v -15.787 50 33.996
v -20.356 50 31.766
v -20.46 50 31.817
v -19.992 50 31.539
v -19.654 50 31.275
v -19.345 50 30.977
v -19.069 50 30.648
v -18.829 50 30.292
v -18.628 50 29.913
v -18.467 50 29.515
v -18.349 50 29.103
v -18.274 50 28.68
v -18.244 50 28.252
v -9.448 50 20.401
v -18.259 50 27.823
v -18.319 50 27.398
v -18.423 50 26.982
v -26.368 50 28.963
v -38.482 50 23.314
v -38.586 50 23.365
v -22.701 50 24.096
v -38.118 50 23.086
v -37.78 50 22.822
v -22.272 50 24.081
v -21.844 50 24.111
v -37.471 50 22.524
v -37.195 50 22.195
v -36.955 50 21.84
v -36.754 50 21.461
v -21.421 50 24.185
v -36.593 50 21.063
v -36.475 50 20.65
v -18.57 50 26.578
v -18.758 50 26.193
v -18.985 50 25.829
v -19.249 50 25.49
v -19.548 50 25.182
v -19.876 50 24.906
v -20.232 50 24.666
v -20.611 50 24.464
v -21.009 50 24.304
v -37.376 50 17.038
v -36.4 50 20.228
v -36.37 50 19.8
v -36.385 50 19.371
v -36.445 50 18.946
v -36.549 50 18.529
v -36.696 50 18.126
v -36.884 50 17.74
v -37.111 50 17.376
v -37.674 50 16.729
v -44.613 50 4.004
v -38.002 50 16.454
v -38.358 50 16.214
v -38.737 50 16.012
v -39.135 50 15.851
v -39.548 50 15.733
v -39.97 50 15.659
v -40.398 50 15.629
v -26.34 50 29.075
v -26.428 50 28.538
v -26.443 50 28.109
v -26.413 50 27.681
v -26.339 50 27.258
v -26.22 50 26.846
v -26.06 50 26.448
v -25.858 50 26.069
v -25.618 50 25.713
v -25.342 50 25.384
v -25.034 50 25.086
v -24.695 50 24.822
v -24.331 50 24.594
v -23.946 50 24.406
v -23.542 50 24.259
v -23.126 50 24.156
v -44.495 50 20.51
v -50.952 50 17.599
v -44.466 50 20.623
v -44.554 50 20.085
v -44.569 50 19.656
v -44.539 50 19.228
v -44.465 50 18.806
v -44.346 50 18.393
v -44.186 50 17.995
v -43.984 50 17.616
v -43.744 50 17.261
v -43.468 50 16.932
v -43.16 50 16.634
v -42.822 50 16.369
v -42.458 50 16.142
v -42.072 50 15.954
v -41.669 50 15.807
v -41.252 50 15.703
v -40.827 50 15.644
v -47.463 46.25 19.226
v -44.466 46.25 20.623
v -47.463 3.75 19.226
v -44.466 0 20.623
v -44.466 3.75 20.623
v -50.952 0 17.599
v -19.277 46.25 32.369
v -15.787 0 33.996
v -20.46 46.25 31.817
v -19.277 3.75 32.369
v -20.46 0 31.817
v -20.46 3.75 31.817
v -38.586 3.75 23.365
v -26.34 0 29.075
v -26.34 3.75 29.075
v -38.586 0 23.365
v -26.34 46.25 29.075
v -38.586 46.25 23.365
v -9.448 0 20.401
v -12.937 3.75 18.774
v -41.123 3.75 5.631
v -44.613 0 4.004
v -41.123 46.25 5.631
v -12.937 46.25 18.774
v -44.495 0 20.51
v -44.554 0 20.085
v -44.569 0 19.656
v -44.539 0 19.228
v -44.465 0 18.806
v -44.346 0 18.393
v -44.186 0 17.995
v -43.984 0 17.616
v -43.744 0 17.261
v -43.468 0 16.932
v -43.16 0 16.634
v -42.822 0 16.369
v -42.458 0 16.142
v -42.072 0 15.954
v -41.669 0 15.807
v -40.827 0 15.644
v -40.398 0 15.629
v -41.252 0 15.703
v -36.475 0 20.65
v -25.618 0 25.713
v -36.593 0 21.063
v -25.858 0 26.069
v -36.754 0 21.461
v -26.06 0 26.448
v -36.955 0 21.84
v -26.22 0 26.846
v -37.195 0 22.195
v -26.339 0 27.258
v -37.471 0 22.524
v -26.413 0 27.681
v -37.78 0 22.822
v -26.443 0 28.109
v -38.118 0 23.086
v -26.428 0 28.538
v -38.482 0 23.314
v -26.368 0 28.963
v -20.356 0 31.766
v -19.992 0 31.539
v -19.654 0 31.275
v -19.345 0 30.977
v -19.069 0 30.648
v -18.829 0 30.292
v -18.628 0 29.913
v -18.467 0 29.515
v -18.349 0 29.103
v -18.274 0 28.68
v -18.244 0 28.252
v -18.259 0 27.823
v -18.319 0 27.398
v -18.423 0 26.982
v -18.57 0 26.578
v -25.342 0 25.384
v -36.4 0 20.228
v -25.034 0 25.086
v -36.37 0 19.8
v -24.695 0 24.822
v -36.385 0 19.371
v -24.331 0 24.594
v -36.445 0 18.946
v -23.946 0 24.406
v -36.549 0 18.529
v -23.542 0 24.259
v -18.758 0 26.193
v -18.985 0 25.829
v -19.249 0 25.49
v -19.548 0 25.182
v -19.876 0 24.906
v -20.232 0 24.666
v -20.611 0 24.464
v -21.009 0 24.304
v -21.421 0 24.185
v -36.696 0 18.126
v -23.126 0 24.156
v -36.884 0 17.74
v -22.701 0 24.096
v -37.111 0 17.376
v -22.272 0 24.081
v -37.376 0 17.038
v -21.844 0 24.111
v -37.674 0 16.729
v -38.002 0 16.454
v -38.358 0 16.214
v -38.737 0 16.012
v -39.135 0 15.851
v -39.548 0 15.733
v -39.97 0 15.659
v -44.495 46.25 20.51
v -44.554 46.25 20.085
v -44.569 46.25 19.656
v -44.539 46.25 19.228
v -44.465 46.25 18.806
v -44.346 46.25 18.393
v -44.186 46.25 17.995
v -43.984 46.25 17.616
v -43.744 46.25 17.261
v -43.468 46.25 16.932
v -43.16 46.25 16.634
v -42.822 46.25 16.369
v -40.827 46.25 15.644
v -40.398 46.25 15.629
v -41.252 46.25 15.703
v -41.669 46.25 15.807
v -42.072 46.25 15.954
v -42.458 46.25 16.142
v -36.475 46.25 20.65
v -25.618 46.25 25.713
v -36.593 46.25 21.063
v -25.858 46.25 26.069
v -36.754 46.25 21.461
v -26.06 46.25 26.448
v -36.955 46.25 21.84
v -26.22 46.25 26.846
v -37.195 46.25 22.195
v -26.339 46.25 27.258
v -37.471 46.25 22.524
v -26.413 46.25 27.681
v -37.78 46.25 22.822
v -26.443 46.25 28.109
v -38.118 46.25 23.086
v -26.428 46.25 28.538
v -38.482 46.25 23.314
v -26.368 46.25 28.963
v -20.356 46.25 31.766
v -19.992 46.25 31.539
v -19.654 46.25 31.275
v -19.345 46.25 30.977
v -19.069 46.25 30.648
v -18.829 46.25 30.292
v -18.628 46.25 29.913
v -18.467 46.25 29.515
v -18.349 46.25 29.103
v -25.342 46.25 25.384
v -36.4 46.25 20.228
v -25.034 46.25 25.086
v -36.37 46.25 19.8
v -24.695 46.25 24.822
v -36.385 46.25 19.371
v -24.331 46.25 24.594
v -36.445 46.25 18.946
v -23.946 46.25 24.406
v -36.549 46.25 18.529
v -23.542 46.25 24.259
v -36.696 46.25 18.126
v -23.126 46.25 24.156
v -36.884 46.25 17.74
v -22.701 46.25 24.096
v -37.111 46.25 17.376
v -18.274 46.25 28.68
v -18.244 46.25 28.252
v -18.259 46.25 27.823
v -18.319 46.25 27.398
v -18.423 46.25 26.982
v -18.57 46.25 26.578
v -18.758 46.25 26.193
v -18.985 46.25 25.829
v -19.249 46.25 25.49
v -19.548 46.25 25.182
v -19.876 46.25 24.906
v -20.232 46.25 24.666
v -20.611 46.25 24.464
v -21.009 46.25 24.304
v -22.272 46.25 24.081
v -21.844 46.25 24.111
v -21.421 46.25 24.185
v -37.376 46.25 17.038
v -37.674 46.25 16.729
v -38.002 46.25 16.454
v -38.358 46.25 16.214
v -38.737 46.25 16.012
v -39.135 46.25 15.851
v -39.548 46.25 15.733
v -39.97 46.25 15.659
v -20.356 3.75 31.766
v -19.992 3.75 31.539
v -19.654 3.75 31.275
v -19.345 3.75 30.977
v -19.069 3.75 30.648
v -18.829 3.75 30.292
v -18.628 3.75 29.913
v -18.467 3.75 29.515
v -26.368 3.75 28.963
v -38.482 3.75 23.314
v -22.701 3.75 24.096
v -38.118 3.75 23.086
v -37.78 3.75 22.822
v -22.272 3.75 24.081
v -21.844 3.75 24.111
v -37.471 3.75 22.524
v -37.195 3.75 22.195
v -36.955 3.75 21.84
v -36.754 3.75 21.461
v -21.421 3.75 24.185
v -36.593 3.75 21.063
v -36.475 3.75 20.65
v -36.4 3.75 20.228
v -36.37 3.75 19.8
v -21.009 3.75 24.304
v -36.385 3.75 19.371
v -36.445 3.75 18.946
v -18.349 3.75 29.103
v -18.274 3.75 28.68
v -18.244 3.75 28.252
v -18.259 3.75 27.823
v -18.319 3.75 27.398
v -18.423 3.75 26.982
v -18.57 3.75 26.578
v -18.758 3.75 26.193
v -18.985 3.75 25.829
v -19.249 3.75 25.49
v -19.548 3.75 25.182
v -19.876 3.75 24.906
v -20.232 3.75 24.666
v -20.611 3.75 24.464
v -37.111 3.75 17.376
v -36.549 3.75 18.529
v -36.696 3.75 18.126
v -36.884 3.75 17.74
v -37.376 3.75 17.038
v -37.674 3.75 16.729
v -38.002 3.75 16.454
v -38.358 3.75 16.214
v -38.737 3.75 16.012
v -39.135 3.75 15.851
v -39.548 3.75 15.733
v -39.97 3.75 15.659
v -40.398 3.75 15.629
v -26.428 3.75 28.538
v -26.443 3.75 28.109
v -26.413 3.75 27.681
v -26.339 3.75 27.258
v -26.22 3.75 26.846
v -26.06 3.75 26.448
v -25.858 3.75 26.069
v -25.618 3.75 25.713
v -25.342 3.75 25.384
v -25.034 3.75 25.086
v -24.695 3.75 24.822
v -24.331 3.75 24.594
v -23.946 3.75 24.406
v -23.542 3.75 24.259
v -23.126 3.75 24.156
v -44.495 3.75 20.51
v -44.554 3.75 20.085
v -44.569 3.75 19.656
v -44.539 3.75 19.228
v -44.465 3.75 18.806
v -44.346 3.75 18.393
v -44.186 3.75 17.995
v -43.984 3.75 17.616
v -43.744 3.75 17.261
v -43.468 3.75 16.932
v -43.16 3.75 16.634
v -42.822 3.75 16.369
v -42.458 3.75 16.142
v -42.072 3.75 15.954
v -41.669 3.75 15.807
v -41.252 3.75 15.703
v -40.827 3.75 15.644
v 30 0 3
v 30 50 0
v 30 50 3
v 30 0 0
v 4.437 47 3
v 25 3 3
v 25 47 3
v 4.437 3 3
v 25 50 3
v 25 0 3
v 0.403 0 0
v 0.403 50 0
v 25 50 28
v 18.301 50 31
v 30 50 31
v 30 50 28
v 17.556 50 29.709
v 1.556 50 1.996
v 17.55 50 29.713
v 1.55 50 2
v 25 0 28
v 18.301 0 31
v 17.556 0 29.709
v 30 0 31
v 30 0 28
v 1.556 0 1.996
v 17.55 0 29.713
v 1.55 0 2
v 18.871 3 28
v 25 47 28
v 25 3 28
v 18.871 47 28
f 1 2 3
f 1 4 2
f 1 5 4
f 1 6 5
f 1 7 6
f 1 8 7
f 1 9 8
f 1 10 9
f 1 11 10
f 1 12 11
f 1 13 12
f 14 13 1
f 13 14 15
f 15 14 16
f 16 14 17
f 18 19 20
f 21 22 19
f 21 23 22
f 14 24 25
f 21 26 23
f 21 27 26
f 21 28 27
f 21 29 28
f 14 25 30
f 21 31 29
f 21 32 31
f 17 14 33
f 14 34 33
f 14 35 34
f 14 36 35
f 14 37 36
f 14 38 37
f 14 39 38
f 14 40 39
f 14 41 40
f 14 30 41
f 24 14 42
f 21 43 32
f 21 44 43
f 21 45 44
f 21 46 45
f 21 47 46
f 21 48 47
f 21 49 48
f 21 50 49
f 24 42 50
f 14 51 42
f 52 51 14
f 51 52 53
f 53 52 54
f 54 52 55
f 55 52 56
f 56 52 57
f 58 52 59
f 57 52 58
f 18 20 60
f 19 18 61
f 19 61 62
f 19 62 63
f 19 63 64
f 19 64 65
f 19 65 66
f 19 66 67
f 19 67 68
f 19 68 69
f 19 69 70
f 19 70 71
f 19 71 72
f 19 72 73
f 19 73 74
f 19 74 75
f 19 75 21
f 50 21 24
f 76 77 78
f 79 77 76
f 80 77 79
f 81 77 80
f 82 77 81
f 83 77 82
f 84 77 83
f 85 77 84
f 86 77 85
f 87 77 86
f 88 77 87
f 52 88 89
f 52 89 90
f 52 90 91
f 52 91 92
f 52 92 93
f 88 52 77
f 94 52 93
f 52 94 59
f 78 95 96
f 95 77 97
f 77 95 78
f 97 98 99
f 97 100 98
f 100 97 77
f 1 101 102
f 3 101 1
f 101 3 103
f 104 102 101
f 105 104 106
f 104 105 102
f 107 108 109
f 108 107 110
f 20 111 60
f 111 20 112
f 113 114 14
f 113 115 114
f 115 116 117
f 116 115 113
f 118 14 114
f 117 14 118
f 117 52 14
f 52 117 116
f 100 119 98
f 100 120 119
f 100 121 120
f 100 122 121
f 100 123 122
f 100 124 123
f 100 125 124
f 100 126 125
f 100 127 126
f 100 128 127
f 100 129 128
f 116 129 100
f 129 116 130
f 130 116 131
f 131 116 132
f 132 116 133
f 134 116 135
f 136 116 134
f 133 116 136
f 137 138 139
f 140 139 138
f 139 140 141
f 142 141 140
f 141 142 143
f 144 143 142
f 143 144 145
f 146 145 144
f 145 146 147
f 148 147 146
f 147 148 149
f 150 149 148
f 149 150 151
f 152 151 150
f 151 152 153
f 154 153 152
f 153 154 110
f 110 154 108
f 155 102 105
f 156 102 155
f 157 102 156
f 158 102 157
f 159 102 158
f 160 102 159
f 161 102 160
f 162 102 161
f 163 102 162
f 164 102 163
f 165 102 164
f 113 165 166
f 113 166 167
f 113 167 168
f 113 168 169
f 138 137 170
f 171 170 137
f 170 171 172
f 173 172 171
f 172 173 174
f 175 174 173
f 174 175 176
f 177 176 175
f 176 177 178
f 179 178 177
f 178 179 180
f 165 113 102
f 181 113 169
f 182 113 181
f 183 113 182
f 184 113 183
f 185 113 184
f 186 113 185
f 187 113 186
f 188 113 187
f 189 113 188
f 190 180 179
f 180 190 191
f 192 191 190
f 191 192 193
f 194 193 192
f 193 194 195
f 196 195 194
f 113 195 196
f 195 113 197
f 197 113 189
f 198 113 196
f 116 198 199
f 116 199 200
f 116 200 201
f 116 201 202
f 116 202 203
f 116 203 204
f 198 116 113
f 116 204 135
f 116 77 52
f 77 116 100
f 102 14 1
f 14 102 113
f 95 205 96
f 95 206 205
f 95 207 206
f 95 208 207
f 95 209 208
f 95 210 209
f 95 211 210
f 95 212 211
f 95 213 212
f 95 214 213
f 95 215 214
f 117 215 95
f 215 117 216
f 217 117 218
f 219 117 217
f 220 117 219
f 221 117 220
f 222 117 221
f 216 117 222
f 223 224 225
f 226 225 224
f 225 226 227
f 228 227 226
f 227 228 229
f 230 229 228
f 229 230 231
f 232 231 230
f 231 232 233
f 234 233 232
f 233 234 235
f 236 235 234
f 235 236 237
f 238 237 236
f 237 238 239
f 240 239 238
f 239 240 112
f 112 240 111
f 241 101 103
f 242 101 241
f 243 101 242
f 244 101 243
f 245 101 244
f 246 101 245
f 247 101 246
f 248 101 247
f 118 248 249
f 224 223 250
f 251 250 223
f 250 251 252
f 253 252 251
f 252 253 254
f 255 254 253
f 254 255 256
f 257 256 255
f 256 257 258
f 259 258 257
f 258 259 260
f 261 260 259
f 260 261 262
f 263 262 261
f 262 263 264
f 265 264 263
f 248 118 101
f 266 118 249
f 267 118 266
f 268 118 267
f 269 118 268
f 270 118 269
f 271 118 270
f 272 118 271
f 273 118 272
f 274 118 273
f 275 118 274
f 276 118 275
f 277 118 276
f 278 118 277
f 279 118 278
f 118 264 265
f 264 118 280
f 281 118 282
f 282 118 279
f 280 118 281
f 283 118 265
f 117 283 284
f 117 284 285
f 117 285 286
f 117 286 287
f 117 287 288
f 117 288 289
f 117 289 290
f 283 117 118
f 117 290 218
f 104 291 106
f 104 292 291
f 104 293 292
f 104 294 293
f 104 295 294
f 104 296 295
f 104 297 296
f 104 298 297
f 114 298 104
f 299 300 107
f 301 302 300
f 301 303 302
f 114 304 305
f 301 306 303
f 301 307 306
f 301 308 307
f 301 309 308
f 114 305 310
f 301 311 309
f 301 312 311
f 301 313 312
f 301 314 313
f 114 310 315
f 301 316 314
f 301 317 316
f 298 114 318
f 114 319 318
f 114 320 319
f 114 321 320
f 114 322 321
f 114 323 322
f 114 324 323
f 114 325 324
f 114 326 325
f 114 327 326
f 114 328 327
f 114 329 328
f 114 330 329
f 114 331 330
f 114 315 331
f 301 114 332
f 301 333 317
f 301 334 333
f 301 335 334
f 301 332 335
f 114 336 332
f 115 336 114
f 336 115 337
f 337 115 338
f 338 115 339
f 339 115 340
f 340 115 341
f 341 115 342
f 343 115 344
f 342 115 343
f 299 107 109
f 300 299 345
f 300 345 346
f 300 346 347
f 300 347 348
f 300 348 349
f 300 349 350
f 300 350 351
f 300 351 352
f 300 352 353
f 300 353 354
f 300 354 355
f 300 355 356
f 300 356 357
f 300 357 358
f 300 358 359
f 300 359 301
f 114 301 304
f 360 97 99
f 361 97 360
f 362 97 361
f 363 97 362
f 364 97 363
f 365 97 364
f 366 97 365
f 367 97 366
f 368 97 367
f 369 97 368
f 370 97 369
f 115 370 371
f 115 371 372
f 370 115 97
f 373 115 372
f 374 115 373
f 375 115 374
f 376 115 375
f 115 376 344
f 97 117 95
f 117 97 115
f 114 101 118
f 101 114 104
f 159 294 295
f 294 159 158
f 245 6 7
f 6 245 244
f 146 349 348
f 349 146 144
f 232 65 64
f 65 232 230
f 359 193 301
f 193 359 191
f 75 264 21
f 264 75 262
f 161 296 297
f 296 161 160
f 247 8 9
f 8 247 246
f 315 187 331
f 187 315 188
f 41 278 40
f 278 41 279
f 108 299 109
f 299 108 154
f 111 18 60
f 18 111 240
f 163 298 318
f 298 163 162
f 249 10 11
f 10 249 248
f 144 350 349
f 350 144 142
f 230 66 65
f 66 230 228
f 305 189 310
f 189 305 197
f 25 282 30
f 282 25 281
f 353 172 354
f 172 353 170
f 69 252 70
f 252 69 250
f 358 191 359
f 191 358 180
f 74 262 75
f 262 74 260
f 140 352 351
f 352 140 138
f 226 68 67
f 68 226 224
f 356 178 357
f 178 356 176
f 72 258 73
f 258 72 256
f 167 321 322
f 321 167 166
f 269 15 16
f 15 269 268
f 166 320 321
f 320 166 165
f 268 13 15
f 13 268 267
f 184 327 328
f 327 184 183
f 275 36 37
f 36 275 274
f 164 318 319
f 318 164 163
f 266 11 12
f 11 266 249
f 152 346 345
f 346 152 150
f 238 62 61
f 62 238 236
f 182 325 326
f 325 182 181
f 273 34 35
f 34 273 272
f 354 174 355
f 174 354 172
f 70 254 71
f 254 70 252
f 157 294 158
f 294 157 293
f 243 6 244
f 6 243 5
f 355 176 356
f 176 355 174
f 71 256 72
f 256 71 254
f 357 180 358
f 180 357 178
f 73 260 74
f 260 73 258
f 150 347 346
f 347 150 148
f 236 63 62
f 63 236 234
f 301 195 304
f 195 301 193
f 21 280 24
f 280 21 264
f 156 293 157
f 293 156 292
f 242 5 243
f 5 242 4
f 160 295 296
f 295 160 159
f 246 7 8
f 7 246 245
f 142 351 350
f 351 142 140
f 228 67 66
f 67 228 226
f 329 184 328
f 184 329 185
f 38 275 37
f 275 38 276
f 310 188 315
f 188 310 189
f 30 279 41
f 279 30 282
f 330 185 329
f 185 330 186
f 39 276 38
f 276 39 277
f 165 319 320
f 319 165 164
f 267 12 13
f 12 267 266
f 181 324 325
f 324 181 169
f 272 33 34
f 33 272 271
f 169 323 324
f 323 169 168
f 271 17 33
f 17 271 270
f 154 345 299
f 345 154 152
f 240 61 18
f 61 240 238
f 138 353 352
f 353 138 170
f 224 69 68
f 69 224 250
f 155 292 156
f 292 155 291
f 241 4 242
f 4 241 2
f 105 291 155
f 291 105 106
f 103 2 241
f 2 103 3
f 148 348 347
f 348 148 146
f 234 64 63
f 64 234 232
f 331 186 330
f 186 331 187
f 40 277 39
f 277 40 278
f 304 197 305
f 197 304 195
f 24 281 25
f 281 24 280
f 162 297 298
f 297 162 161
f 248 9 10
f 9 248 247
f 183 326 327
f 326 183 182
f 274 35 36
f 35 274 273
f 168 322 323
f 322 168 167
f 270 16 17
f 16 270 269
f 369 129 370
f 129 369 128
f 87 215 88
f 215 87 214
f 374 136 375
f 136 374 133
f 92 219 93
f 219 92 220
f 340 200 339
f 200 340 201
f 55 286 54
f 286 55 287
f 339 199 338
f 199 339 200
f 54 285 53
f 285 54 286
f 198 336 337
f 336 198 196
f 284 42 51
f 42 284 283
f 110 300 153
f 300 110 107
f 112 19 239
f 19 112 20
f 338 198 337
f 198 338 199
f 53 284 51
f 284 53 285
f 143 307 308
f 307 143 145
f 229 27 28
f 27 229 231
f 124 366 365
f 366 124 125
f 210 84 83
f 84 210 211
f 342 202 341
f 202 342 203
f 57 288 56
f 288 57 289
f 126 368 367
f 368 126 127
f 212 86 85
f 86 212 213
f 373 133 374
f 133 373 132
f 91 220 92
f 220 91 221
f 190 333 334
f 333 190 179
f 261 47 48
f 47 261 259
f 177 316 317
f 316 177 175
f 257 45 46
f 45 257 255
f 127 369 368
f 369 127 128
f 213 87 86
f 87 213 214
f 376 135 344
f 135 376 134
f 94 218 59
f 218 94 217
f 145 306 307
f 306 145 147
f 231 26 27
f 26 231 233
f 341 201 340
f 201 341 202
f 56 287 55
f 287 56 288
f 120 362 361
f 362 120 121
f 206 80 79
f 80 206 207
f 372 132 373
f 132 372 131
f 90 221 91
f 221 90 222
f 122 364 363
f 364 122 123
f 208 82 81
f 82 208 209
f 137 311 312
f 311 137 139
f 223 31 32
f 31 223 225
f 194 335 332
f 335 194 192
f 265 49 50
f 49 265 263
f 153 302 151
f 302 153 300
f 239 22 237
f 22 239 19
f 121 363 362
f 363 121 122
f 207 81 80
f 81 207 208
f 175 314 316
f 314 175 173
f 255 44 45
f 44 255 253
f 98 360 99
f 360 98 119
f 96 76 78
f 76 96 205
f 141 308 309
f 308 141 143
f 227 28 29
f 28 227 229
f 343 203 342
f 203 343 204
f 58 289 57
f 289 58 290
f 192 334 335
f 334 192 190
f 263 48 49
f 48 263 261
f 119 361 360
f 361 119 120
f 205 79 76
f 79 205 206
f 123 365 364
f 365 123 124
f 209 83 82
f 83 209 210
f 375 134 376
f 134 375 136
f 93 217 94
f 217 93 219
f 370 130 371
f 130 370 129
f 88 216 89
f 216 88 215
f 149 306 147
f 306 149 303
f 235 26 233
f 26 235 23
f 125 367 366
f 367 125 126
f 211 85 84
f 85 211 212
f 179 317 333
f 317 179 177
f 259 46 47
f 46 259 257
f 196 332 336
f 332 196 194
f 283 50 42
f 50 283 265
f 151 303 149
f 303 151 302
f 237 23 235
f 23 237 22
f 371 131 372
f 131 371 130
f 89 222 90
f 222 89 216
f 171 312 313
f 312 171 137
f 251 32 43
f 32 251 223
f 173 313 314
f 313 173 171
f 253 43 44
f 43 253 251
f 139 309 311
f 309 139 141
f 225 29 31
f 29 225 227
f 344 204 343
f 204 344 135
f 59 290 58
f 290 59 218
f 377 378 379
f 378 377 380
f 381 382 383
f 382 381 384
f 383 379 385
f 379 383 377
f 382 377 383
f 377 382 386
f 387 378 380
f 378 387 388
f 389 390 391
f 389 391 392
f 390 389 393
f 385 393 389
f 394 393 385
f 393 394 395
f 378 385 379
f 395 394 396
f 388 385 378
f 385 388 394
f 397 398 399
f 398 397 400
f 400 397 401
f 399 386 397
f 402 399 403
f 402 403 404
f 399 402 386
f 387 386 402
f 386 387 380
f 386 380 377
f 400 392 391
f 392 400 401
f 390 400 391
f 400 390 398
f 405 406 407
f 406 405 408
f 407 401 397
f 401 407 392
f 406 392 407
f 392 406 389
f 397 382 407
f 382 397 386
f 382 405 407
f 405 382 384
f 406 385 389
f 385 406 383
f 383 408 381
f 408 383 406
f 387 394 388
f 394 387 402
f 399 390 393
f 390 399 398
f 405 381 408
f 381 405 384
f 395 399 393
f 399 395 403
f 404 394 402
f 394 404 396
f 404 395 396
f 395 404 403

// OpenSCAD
module caja () {

difference () {
union (){
cube ([30,50,3]);
translate ([0,0,28]) cube ([30,50,3]);
cube ([25,3,28]);
translate ([0,47,0]) cube ([25,3,28]);
}
translate ([-25,-0.5,0]) rotate ([0,30,0]) cube ([22,51,70]);

}
translate ([1.55,0,2]) rotate ([0,30,0]) cube ([2,50,32]);

}


/*rotate ([0,-115,0]) difference () {
scale ([1,1,1.25]) caja () ;

translate ([0,20,18])  rotate ([0,30,0]) cube ([10,22,19]);
translate ([25,0,4.5]) cube ([5,50,29]);
translate ([8,10,25]) rotate ([0,115,0])  cylinder (r=1.7, h=10, $fn=60);
}*/



translate ([-30.2,25,19]) rotate ([-25,0,90]) difference (){
cube ([50, 38.8, 15], center=true);
cube ([50.5-8, 39.10-8, 16], center=true);

translate ([26,-11,5]) rotate ([0,-90,0])  cylinder (r=4.1, h=52, $fn=60);
translate ([26,9,5]) rotate ([0,-90,0])  cylinder (r=4.1, h=52, $fn=60);


}

caja();
